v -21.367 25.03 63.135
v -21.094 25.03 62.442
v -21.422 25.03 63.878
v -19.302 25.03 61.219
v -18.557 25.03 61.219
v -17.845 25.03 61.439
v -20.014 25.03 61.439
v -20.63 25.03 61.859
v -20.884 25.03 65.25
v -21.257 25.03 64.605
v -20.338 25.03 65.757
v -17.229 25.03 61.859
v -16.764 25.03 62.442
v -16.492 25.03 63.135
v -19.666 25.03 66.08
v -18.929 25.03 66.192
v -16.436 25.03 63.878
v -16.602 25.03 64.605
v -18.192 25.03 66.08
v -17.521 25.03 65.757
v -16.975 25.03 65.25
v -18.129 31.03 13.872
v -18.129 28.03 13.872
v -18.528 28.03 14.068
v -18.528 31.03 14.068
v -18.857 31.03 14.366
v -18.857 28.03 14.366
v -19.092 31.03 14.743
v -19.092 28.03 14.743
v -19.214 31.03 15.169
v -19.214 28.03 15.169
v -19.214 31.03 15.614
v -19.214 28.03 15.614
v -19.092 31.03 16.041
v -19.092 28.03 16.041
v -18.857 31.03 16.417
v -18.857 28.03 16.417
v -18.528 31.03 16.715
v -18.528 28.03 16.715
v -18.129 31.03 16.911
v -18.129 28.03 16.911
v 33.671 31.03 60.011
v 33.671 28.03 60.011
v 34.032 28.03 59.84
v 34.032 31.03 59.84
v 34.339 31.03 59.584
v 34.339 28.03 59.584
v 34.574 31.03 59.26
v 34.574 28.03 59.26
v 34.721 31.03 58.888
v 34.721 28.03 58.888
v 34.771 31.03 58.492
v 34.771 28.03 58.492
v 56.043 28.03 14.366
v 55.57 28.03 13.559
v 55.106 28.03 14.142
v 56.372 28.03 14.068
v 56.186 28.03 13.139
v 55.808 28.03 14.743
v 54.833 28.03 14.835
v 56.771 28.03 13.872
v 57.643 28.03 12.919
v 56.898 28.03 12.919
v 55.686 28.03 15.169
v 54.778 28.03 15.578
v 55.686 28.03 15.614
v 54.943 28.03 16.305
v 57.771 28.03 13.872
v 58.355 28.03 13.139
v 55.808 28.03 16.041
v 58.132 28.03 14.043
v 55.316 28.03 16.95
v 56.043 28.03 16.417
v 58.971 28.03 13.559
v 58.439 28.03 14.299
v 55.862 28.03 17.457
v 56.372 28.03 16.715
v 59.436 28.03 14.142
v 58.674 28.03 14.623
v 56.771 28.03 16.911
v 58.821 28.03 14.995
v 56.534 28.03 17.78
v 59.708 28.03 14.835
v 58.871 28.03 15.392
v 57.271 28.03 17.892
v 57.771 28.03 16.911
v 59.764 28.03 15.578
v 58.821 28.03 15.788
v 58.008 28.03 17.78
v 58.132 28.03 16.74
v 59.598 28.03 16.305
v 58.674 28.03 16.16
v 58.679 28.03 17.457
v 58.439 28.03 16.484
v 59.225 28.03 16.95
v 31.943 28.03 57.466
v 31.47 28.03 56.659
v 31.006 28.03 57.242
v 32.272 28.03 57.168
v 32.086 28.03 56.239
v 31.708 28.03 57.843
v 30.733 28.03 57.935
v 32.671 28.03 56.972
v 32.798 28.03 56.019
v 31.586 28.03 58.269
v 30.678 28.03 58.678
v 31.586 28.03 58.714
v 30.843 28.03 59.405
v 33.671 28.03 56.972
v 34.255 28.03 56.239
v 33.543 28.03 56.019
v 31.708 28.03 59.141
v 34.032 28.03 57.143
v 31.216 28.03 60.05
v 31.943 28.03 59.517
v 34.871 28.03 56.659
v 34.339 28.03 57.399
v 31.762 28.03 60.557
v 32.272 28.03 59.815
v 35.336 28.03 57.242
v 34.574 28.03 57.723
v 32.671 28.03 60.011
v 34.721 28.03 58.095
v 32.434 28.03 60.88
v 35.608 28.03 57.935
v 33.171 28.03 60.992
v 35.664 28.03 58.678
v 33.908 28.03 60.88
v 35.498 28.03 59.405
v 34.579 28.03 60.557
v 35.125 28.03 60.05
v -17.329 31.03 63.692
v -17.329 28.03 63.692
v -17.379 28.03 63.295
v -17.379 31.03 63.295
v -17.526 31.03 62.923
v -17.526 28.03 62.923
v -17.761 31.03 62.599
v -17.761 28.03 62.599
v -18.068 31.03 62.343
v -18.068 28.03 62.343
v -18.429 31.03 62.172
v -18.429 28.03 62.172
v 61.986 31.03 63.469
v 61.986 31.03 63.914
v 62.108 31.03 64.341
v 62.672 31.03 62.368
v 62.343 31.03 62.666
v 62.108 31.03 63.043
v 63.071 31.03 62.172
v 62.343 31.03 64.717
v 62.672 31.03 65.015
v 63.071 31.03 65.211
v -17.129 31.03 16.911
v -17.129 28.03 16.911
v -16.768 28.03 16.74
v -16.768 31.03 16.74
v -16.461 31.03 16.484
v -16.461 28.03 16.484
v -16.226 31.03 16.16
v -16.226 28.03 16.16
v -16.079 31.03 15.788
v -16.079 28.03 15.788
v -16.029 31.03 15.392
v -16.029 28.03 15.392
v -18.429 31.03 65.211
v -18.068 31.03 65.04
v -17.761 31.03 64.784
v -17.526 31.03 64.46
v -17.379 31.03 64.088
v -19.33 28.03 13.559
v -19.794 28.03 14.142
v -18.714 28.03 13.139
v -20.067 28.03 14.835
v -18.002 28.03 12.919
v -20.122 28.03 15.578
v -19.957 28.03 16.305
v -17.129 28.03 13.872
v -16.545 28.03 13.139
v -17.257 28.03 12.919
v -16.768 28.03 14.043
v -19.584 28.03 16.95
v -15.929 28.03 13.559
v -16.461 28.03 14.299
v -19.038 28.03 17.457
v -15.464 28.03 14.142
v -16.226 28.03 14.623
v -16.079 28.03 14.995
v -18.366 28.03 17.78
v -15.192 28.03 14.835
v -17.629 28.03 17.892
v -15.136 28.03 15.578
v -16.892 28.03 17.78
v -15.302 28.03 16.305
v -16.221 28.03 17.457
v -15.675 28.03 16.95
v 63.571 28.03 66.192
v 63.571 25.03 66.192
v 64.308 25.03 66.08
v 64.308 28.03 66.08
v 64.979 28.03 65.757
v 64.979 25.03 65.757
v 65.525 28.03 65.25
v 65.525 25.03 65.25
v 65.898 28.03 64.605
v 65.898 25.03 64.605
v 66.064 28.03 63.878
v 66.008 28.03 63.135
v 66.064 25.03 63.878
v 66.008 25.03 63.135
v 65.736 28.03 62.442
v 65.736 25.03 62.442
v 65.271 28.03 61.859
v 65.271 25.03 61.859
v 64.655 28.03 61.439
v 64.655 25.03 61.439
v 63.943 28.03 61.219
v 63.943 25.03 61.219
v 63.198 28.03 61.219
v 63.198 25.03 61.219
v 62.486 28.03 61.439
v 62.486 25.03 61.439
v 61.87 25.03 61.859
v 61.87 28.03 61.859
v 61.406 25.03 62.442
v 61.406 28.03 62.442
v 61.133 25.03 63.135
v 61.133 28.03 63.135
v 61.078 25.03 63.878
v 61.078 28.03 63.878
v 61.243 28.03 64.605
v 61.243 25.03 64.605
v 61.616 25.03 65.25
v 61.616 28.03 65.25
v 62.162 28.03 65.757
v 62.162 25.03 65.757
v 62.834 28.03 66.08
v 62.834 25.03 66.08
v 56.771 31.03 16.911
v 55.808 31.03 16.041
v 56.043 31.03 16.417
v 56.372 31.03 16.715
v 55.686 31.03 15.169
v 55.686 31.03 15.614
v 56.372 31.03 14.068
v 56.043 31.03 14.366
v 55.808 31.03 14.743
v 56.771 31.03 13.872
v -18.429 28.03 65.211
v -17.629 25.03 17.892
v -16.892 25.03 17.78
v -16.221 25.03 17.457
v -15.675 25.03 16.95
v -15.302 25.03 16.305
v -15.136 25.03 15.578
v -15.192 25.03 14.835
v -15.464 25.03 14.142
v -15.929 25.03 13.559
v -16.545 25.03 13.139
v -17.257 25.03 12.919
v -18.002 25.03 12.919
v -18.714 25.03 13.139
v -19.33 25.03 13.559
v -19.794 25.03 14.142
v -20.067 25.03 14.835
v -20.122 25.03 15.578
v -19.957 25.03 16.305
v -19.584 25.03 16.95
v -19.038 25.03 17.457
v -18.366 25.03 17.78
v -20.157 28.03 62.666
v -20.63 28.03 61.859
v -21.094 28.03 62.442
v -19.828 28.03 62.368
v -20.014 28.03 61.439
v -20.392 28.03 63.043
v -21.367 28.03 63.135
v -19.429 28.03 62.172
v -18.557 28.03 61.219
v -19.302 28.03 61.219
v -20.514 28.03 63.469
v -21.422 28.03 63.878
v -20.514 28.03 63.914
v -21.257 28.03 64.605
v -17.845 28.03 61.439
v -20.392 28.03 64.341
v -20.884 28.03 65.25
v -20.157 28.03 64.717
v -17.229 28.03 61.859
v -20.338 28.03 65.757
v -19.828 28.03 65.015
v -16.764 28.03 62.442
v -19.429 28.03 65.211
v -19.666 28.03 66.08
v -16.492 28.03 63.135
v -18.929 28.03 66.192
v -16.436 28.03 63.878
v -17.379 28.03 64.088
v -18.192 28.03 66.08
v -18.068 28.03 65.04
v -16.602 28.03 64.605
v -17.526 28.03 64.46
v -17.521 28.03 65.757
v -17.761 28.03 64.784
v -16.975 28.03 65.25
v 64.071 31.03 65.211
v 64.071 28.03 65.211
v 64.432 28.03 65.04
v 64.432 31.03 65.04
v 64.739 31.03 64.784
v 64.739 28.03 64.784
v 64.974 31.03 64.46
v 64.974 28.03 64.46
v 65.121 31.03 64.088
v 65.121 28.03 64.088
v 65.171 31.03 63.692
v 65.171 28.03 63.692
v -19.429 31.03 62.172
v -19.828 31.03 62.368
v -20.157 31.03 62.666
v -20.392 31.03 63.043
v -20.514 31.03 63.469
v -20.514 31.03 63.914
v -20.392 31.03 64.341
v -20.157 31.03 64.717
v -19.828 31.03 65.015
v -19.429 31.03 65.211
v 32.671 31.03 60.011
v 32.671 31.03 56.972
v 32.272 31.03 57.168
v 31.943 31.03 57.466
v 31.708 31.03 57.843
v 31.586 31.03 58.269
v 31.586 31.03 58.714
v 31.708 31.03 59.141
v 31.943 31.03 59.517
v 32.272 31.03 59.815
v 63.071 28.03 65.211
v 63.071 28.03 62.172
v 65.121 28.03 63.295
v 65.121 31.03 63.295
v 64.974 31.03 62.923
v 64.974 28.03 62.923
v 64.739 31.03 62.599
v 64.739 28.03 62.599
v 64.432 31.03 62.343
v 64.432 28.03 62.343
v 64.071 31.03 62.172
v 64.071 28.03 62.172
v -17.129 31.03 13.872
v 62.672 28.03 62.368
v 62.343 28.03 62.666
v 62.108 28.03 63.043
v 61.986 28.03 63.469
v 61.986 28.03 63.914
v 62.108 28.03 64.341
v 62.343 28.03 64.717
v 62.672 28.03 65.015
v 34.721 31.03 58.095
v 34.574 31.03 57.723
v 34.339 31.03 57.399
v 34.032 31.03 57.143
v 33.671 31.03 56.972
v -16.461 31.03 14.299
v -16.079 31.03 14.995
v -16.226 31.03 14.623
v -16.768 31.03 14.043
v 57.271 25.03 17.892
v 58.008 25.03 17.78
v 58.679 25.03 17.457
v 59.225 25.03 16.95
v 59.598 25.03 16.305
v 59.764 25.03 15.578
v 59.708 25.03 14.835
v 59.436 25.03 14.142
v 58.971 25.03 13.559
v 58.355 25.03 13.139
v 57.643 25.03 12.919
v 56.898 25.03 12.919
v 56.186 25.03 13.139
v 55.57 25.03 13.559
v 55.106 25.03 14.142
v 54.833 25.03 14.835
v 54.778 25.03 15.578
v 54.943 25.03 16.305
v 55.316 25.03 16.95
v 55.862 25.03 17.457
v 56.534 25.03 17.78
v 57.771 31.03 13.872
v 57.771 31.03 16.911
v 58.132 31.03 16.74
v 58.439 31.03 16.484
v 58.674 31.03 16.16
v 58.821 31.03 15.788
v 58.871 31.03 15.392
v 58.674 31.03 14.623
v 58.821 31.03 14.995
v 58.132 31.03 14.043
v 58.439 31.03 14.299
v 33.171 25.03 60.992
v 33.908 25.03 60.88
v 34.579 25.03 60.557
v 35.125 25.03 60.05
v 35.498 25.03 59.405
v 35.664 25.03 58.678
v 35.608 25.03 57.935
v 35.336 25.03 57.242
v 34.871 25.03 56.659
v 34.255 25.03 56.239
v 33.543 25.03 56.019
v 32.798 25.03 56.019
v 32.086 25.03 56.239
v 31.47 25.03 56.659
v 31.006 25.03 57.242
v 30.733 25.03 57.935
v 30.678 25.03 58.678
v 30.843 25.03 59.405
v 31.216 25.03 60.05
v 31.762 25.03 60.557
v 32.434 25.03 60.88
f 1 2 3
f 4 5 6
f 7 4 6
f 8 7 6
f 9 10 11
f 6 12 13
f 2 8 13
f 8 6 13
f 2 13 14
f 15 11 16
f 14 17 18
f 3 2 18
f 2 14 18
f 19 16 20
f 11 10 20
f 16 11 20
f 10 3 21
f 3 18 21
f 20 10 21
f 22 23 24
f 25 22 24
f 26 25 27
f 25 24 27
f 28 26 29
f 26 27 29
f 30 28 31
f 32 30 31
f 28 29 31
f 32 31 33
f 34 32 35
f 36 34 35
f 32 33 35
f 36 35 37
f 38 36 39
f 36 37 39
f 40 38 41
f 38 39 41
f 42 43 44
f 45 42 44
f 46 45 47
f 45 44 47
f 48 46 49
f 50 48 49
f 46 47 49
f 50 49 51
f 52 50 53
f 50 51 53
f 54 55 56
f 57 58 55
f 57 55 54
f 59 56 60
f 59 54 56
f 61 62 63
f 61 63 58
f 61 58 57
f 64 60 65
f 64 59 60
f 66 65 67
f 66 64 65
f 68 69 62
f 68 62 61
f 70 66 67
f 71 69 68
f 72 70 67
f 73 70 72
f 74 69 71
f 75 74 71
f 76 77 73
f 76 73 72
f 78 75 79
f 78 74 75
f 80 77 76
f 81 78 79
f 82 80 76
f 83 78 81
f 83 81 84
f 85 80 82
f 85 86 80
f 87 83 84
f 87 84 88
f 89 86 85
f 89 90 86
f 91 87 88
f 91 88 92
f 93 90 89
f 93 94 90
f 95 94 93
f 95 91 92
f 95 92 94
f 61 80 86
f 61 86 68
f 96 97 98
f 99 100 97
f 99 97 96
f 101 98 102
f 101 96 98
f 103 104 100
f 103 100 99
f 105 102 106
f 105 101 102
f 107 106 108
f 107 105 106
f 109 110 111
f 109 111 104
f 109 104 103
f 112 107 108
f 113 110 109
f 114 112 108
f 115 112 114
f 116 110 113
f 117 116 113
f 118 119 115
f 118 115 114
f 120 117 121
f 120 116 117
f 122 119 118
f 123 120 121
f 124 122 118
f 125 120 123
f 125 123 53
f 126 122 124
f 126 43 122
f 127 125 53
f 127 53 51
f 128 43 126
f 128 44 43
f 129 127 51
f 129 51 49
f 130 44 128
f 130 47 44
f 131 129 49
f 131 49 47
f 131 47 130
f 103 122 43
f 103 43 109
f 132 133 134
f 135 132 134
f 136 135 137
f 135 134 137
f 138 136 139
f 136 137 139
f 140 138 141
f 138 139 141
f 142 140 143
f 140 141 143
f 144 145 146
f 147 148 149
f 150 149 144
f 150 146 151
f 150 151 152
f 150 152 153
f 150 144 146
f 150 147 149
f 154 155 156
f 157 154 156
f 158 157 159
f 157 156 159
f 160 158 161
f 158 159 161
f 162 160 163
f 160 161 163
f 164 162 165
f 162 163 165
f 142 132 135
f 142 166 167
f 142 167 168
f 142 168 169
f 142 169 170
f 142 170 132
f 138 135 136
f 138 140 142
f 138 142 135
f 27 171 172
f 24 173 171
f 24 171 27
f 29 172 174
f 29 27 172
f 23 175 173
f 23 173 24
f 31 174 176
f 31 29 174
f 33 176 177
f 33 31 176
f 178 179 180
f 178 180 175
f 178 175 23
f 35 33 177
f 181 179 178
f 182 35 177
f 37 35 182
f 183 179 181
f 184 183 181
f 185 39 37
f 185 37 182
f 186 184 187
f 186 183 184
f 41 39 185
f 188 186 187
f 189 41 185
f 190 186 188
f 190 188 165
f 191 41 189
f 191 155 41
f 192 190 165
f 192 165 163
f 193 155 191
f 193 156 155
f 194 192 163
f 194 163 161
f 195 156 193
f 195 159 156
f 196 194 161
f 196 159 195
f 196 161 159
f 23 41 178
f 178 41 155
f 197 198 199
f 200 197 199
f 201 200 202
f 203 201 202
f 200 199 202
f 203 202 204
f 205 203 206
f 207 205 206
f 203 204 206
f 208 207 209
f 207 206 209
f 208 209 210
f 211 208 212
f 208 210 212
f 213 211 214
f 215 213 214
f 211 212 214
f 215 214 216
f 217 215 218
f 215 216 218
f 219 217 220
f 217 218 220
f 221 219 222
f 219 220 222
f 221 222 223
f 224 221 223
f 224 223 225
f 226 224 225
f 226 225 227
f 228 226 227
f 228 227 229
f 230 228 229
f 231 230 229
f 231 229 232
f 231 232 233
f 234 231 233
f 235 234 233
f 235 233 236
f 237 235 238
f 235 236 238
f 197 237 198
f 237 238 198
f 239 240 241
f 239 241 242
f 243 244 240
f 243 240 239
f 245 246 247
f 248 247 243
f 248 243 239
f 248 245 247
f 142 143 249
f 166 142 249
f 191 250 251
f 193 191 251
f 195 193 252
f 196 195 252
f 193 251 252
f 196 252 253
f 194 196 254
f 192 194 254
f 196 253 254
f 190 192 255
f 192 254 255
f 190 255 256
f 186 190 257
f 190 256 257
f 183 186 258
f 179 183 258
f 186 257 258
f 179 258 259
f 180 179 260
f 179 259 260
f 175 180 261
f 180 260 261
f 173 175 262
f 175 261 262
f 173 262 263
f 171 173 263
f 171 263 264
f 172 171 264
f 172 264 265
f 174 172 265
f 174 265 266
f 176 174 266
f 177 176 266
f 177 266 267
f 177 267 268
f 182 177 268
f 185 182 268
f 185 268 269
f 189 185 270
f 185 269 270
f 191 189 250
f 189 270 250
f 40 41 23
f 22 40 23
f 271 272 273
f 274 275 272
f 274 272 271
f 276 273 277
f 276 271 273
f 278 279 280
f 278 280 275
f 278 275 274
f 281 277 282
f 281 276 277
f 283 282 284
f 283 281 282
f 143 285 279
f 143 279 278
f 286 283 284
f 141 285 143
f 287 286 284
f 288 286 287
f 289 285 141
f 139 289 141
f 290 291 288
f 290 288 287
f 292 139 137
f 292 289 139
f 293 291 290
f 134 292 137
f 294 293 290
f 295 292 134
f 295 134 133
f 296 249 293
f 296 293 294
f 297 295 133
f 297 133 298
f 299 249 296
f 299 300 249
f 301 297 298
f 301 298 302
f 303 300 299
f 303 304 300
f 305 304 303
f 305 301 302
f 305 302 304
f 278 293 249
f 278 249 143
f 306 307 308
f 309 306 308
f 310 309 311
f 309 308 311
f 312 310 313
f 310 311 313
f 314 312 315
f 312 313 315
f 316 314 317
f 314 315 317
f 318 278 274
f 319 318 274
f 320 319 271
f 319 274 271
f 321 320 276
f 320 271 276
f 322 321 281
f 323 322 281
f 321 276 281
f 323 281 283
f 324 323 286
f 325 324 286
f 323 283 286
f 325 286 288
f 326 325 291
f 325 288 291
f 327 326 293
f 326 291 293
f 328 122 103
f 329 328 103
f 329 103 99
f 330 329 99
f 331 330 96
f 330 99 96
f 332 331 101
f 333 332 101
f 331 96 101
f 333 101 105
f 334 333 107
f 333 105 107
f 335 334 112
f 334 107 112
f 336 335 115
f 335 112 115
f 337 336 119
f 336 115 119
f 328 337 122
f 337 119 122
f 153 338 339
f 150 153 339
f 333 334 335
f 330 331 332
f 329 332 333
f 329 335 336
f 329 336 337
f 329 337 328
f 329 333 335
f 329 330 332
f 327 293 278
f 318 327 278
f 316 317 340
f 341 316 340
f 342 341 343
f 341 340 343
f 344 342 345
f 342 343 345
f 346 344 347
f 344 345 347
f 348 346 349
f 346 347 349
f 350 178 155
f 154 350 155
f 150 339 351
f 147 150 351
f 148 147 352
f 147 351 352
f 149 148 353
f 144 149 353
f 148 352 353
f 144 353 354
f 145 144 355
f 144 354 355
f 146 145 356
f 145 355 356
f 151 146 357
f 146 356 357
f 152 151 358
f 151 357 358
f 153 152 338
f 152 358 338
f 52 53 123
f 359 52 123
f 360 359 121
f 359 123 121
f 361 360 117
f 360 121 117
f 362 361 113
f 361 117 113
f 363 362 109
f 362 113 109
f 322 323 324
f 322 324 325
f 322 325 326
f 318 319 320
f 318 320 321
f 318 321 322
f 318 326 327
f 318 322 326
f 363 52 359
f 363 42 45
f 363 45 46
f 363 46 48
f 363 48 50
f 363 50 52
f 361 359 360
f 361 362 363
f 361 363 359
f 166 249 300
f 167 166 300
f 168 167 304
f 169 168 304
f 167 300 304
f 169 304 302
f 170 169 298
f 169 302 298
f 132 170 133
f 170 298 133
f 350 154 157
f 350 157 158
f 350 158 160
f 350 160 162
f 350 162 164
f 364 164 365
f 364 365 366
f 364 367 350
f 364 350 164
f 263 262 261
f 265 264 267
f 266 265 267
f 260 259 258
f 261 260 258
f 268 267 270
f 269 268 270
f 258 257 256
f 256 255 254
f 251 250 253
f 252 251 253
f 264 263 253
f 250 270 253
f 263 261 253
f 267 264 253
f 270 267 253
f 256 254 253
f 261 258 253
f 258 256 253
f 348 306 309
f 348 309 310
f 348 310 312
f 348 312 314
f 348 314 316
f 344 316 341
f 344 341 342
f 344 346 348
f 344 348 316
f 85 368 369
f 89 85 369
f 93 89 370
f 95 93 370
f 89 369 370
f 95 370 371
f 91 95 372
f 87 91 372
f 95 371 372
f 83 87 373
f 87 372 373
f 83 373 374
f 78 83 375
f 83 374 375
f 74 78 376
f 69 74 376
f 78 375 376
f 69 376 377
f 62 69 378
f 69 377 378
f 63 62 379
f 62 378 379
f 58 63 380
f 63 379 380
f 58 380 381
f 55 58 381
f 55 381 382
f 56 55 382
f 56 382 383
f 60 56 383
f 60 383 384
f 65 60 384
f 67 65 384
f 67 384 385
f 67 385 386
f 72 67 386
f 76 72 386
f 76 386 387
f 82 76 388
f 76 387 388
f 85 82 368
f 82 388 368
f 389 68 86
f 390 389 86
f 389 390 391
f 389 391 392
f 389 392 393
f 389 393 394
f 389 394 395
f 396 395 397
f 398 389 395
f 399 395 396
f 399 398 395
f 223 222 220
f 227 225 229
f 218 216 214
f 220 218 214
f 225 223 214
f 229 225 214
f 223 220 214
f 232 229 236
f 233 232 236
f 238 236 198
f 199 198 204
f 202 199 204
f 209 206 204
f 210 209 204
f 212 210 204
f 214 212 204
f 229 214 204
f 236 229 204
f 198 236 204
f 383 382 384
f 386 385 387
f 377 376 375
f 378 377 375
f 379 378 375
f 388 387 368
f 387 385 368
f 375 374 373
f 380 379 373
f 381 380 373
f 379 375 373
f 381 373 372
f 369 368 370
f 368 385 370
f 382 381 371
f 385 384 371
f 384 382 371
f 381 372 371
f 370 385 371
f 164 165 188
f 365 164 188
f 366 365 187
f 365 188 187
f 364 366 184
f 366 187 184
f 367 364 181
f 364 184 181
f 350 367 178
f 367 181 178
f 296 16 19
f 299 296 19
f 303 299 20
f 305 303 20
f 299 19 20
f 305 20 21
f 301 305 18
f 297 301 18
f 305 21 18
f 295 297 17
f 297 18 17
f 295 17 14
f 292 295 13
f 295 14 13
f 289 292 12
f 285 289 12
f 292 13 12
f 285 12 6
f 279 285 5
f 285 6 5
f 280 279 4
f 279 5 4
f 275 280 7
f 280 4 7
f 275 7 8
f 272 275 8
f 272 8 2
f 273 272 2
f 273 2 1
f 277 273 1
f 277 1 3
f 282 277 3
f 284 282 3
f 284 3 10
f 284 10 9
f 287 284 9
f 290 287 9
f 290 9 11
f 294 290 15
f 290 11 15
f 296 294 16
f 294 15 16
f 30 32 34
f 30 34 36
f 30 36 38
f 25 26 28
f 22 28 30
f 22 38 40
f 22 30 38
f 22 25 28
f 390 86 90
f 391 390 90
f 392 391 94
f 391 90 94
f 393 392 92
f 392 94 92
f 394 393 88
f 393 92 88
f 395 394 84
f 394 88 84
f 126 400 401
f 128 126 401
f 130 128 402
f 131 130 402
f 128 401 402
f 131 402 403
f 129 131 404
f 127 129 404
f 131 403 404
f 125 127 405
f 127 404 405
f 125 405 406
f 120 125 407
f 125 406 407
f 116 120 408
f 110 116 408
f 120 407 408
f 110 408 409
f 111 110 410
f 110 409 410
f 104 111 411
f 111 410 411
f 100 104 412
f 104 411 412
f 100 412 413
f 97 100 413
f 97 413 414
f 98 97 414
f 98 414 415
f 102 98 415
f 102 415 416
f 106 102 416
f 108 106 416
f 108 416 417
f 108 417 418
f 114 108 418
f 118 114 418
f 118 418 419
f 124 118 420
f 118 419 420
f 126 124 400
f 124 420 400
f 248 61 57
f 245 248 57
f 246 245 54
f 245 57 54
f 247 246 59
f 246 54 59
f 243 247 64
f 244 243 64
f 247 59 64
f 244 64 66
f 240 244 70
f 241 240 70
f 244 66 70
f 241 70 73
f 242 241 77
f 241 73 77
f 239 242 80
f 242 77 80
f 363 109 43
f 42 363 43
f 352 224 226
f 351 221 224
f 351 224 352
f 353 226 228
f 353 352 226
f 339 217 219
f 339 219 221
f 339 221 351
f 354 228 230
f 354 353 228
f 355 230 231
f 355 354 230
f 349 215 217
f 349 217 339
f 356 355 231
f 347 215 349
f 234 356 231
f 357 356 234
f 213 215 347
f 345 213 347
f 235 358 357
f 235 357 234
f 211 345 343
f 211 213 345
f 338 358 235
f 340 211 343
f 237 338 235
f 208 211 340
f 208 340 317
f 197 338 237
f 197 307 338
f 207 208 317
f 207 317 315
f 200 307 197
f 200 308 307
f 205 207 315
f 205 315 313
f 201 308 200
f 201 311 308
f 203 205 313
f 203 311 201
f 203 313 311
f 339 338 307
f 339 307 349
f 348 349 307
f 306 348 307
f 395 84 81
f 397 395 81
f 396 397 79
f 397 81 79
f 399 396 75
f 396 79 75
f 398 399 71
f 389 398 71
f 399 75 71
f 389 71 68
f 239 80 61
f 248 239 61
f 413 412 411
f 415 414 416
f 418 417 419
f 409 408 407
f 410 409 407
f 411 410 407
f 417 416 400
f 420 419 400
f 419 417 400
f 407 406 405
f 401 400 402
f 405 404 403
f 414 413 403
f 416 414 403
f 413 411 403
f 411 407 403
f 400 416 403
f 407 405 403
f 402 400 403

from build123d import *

# Parameters (mm, degrees)
SKETCH3_R             = 2.5
BOSS_EXTRUDE2_DEPTH   = 3
BOSS_EXTRUDE2_2_DEPTH = 3
BOSS_EXTRUDE2_3_DEPTH = 3
BOSS_EXTRUDE2_4_DEPTH = 3
BOSS_EXTRUDE2_5_DEPTH = 3
BOSS_EXTRUDE1_START   = 3
BOSS_EXTRUDE1_DEPTH   = 3


with BuildPart() as part:
    # Sketch3 → Boss-Extrude2 (new body)
    with BuildSketch(Plane(origin=(0, 25.029873021, 0), x_dir=(1, 0, 0), z_dir=(0, 1, 0))):
        with Locations(Location((-17.62934747, -15.391511653, 0), (0, 0, 270))):
            Circle(SKETCH3_R)
    extrude(amount=BOSS_EXTRUDE2_DEPTH)



with BuildPart() as body_2:
    # Sketch3 → Boss-Extrude2 2 (new body)
    with BuildSketch(Plane(origin=(0, 25.029873021, 0), x_dir=(1, 0, 0), z_dir=(0, 1, 0))):
        with Locations(Location((57.27065253, -15.391511653, 0), (0, 0, 270))):
            Circle(SKETCH3_R)
    extrude(amount=BOSS_EXTRUDE2_2_DEPTH)


with BuildPart() as body_3:
    # Sketch3 → Boss-Extrude2 3 (new body)
    with BuildSketch(Plane(origin=(0, 25.029873021, 0), x_dir=(1, 0, 0), z_dir=(0, 1, 0))):
        with Locations(Location((63.57065253, -63.691511653, 0), (0, 0, 270))):
            Circle(SKETCH3_R)
    extrude(amount=BOSS_EXTRUDE2_3_DEPTH)


with BuildPart() as body_4:
    # Sketch3 → Boss-Extrude2 4 (new body)
    with BuildSketch(Plane(origin=(0, 25.029873021, 0), x_dir=(1, 0, 0), z_dir=(0, 1, 0))):
        with Locations(Location((33.17065253, -58.491511653, 0), (0, 0, 270))):
            Circle(SKETCH3_R)
    extrude(amount=BOSS_EXTRUDE2_4_DEPTH)


with BuildPart() as body_5:
    # Sketch3 → Boss-Extrude2 5 (new body)
    with BuildSketch(Plane(origin=(0, 25.029873021, 0), x_dir=(1, 0, 0), z_dir=(0, 1, 0))):
        with Locations(Location((-18.92934747, -63.691511653, 0), (0, 0, 270))):
            Circle(SKETCH3_R)
    extrude(amount=BOSS_EXTRUDE2_5_DEPTH)


with BuildPart() as part_1:
    add(part.part)

    add(body_2.part)  # Boss-Extrude1 merges body 2

    add(body_3.part)  # Boss-Extrude1 merges body 3

    add(body_4.part)  # Boss-Extrude1 merges body 4

    add(body_5.part)  # Boss-Extrude1 merges body 5
    # Sketch1 → Boss-Extrude1 (add)
    with BuildSketch(Plane(origin=(0, 25.029873021, 0), x_dir=(1, 0, 0), z_dir=(0, 1, 0)).offset(BOSS_EXTRUDE1_START)):
        with BuildLine():
            Line((-17.12934747, -13.871643238), (-17.12934747, -16.911380069))
            ThreePointArc((-17.12934747, -16.911380069), (-16.33319933, -16.329594805), (-16.02934747, -15.391511653))
            ThreePointArc((-16.02934747, -15.391511653), (-16.33319933, -14.453428501), (-17.12934747, -13.871643238))
        make_face()
        with BuildLine():
            ThreePointArc((-18.12934747, -13.871643238), (-19.22934747, -15.391511653), (-18.12934747, -16.911380069))
            Line((-18.12934747, -16.911380069), (-18.12934747, -13.871643238))
        make_face()
        with BuildLine():
            ThreePointArc((65.17065253, -63.691511653), (64.86680067, -62.753428501), (64.07065253, -62.171643238))
            Line((64.07065253, -62.171643238), (64.07065253, -65.211380069))
            ThreePointArc((64.07065253, -65.211380069), (64.86680067, -64.629594805), (65.17065253, -63.691511653))
        make_face()
        with BuildLine():
            Line((63.07065253, -65.211380069), (63.07065253, -62.171643238))
            ThreePointArc((63.07065253, -62.171643238), (61.97065253, -63.691511653), (63.07065253, -65.211380069))
        make_face()
        with BuildLine():
            ThreePointArc((34.77065253, -58.491511653), (34.46680067, -57.553428501), (33.67065253, -56.971643238))
            Line((33.67065253, -56.971643238), (33.67065253, -60.011380069))
            ThreePointArc((33.67065253, -60.011380069), (34.46680067, -59.429594805), (34.77065253, -58.491511653))
        make_face()
        with BuildLine():
            Line((32.67065253, -60.011380069), (32.67065253, -56.971643238))
            ThreePointArc((32.67065253, -56.971643238), (31.57065253, -58.491511653), (32.67065253, -60.011380069))
        make_face()
        with BuildLine():
            ThreePointArc((-17.32934747, -63.691511653), (-17.63319933, -62.753428501), (-18.42934747, -62.171643238))
            Line((-18.42934747, -62.171643238), (-18.42934747, -65.211380069))
            ThreePointArc((-18.42934747, -65.211380069), (-17.63319933, -64.629594805), (-17.32934747, -63.691511653))
        make_face()
        with BuildLine():
            Line((-19.42934747, -65.211380069), (-19.42934747, -62.171643238))
            ThreePointArc((-19.42934747, -62.171643238), (-20.52934747, -63.691511653), (-19.42934747, -65.211380069))
        make_face()
        with BuildLine():
            ThreePointArc((58.87065253, -15.391511653), (58.56680067, -14.453428501), (57.77065253, -13.871643238))
            Line((57.77065253, -13.871643238), (57.77065253, -16.911380069))
            ThreePointArc((57.77065253, -16.911380069), (58.56680067, -16.329594805), (58.87065253, -15.391511653))
        make_face()
        with BuildLine():
            Line((56.77065253, -16.911380069), (56.77065253, -13.871643238))
            ThreePointArc((56.77065253, -13.871643238), (55.67065253, -15.391511653), (56.77065253, -16.911380069))
        make_face()
    extrude(amount=BOSS_EXTRUDE1_DEPTH)


solid = part_1.part
